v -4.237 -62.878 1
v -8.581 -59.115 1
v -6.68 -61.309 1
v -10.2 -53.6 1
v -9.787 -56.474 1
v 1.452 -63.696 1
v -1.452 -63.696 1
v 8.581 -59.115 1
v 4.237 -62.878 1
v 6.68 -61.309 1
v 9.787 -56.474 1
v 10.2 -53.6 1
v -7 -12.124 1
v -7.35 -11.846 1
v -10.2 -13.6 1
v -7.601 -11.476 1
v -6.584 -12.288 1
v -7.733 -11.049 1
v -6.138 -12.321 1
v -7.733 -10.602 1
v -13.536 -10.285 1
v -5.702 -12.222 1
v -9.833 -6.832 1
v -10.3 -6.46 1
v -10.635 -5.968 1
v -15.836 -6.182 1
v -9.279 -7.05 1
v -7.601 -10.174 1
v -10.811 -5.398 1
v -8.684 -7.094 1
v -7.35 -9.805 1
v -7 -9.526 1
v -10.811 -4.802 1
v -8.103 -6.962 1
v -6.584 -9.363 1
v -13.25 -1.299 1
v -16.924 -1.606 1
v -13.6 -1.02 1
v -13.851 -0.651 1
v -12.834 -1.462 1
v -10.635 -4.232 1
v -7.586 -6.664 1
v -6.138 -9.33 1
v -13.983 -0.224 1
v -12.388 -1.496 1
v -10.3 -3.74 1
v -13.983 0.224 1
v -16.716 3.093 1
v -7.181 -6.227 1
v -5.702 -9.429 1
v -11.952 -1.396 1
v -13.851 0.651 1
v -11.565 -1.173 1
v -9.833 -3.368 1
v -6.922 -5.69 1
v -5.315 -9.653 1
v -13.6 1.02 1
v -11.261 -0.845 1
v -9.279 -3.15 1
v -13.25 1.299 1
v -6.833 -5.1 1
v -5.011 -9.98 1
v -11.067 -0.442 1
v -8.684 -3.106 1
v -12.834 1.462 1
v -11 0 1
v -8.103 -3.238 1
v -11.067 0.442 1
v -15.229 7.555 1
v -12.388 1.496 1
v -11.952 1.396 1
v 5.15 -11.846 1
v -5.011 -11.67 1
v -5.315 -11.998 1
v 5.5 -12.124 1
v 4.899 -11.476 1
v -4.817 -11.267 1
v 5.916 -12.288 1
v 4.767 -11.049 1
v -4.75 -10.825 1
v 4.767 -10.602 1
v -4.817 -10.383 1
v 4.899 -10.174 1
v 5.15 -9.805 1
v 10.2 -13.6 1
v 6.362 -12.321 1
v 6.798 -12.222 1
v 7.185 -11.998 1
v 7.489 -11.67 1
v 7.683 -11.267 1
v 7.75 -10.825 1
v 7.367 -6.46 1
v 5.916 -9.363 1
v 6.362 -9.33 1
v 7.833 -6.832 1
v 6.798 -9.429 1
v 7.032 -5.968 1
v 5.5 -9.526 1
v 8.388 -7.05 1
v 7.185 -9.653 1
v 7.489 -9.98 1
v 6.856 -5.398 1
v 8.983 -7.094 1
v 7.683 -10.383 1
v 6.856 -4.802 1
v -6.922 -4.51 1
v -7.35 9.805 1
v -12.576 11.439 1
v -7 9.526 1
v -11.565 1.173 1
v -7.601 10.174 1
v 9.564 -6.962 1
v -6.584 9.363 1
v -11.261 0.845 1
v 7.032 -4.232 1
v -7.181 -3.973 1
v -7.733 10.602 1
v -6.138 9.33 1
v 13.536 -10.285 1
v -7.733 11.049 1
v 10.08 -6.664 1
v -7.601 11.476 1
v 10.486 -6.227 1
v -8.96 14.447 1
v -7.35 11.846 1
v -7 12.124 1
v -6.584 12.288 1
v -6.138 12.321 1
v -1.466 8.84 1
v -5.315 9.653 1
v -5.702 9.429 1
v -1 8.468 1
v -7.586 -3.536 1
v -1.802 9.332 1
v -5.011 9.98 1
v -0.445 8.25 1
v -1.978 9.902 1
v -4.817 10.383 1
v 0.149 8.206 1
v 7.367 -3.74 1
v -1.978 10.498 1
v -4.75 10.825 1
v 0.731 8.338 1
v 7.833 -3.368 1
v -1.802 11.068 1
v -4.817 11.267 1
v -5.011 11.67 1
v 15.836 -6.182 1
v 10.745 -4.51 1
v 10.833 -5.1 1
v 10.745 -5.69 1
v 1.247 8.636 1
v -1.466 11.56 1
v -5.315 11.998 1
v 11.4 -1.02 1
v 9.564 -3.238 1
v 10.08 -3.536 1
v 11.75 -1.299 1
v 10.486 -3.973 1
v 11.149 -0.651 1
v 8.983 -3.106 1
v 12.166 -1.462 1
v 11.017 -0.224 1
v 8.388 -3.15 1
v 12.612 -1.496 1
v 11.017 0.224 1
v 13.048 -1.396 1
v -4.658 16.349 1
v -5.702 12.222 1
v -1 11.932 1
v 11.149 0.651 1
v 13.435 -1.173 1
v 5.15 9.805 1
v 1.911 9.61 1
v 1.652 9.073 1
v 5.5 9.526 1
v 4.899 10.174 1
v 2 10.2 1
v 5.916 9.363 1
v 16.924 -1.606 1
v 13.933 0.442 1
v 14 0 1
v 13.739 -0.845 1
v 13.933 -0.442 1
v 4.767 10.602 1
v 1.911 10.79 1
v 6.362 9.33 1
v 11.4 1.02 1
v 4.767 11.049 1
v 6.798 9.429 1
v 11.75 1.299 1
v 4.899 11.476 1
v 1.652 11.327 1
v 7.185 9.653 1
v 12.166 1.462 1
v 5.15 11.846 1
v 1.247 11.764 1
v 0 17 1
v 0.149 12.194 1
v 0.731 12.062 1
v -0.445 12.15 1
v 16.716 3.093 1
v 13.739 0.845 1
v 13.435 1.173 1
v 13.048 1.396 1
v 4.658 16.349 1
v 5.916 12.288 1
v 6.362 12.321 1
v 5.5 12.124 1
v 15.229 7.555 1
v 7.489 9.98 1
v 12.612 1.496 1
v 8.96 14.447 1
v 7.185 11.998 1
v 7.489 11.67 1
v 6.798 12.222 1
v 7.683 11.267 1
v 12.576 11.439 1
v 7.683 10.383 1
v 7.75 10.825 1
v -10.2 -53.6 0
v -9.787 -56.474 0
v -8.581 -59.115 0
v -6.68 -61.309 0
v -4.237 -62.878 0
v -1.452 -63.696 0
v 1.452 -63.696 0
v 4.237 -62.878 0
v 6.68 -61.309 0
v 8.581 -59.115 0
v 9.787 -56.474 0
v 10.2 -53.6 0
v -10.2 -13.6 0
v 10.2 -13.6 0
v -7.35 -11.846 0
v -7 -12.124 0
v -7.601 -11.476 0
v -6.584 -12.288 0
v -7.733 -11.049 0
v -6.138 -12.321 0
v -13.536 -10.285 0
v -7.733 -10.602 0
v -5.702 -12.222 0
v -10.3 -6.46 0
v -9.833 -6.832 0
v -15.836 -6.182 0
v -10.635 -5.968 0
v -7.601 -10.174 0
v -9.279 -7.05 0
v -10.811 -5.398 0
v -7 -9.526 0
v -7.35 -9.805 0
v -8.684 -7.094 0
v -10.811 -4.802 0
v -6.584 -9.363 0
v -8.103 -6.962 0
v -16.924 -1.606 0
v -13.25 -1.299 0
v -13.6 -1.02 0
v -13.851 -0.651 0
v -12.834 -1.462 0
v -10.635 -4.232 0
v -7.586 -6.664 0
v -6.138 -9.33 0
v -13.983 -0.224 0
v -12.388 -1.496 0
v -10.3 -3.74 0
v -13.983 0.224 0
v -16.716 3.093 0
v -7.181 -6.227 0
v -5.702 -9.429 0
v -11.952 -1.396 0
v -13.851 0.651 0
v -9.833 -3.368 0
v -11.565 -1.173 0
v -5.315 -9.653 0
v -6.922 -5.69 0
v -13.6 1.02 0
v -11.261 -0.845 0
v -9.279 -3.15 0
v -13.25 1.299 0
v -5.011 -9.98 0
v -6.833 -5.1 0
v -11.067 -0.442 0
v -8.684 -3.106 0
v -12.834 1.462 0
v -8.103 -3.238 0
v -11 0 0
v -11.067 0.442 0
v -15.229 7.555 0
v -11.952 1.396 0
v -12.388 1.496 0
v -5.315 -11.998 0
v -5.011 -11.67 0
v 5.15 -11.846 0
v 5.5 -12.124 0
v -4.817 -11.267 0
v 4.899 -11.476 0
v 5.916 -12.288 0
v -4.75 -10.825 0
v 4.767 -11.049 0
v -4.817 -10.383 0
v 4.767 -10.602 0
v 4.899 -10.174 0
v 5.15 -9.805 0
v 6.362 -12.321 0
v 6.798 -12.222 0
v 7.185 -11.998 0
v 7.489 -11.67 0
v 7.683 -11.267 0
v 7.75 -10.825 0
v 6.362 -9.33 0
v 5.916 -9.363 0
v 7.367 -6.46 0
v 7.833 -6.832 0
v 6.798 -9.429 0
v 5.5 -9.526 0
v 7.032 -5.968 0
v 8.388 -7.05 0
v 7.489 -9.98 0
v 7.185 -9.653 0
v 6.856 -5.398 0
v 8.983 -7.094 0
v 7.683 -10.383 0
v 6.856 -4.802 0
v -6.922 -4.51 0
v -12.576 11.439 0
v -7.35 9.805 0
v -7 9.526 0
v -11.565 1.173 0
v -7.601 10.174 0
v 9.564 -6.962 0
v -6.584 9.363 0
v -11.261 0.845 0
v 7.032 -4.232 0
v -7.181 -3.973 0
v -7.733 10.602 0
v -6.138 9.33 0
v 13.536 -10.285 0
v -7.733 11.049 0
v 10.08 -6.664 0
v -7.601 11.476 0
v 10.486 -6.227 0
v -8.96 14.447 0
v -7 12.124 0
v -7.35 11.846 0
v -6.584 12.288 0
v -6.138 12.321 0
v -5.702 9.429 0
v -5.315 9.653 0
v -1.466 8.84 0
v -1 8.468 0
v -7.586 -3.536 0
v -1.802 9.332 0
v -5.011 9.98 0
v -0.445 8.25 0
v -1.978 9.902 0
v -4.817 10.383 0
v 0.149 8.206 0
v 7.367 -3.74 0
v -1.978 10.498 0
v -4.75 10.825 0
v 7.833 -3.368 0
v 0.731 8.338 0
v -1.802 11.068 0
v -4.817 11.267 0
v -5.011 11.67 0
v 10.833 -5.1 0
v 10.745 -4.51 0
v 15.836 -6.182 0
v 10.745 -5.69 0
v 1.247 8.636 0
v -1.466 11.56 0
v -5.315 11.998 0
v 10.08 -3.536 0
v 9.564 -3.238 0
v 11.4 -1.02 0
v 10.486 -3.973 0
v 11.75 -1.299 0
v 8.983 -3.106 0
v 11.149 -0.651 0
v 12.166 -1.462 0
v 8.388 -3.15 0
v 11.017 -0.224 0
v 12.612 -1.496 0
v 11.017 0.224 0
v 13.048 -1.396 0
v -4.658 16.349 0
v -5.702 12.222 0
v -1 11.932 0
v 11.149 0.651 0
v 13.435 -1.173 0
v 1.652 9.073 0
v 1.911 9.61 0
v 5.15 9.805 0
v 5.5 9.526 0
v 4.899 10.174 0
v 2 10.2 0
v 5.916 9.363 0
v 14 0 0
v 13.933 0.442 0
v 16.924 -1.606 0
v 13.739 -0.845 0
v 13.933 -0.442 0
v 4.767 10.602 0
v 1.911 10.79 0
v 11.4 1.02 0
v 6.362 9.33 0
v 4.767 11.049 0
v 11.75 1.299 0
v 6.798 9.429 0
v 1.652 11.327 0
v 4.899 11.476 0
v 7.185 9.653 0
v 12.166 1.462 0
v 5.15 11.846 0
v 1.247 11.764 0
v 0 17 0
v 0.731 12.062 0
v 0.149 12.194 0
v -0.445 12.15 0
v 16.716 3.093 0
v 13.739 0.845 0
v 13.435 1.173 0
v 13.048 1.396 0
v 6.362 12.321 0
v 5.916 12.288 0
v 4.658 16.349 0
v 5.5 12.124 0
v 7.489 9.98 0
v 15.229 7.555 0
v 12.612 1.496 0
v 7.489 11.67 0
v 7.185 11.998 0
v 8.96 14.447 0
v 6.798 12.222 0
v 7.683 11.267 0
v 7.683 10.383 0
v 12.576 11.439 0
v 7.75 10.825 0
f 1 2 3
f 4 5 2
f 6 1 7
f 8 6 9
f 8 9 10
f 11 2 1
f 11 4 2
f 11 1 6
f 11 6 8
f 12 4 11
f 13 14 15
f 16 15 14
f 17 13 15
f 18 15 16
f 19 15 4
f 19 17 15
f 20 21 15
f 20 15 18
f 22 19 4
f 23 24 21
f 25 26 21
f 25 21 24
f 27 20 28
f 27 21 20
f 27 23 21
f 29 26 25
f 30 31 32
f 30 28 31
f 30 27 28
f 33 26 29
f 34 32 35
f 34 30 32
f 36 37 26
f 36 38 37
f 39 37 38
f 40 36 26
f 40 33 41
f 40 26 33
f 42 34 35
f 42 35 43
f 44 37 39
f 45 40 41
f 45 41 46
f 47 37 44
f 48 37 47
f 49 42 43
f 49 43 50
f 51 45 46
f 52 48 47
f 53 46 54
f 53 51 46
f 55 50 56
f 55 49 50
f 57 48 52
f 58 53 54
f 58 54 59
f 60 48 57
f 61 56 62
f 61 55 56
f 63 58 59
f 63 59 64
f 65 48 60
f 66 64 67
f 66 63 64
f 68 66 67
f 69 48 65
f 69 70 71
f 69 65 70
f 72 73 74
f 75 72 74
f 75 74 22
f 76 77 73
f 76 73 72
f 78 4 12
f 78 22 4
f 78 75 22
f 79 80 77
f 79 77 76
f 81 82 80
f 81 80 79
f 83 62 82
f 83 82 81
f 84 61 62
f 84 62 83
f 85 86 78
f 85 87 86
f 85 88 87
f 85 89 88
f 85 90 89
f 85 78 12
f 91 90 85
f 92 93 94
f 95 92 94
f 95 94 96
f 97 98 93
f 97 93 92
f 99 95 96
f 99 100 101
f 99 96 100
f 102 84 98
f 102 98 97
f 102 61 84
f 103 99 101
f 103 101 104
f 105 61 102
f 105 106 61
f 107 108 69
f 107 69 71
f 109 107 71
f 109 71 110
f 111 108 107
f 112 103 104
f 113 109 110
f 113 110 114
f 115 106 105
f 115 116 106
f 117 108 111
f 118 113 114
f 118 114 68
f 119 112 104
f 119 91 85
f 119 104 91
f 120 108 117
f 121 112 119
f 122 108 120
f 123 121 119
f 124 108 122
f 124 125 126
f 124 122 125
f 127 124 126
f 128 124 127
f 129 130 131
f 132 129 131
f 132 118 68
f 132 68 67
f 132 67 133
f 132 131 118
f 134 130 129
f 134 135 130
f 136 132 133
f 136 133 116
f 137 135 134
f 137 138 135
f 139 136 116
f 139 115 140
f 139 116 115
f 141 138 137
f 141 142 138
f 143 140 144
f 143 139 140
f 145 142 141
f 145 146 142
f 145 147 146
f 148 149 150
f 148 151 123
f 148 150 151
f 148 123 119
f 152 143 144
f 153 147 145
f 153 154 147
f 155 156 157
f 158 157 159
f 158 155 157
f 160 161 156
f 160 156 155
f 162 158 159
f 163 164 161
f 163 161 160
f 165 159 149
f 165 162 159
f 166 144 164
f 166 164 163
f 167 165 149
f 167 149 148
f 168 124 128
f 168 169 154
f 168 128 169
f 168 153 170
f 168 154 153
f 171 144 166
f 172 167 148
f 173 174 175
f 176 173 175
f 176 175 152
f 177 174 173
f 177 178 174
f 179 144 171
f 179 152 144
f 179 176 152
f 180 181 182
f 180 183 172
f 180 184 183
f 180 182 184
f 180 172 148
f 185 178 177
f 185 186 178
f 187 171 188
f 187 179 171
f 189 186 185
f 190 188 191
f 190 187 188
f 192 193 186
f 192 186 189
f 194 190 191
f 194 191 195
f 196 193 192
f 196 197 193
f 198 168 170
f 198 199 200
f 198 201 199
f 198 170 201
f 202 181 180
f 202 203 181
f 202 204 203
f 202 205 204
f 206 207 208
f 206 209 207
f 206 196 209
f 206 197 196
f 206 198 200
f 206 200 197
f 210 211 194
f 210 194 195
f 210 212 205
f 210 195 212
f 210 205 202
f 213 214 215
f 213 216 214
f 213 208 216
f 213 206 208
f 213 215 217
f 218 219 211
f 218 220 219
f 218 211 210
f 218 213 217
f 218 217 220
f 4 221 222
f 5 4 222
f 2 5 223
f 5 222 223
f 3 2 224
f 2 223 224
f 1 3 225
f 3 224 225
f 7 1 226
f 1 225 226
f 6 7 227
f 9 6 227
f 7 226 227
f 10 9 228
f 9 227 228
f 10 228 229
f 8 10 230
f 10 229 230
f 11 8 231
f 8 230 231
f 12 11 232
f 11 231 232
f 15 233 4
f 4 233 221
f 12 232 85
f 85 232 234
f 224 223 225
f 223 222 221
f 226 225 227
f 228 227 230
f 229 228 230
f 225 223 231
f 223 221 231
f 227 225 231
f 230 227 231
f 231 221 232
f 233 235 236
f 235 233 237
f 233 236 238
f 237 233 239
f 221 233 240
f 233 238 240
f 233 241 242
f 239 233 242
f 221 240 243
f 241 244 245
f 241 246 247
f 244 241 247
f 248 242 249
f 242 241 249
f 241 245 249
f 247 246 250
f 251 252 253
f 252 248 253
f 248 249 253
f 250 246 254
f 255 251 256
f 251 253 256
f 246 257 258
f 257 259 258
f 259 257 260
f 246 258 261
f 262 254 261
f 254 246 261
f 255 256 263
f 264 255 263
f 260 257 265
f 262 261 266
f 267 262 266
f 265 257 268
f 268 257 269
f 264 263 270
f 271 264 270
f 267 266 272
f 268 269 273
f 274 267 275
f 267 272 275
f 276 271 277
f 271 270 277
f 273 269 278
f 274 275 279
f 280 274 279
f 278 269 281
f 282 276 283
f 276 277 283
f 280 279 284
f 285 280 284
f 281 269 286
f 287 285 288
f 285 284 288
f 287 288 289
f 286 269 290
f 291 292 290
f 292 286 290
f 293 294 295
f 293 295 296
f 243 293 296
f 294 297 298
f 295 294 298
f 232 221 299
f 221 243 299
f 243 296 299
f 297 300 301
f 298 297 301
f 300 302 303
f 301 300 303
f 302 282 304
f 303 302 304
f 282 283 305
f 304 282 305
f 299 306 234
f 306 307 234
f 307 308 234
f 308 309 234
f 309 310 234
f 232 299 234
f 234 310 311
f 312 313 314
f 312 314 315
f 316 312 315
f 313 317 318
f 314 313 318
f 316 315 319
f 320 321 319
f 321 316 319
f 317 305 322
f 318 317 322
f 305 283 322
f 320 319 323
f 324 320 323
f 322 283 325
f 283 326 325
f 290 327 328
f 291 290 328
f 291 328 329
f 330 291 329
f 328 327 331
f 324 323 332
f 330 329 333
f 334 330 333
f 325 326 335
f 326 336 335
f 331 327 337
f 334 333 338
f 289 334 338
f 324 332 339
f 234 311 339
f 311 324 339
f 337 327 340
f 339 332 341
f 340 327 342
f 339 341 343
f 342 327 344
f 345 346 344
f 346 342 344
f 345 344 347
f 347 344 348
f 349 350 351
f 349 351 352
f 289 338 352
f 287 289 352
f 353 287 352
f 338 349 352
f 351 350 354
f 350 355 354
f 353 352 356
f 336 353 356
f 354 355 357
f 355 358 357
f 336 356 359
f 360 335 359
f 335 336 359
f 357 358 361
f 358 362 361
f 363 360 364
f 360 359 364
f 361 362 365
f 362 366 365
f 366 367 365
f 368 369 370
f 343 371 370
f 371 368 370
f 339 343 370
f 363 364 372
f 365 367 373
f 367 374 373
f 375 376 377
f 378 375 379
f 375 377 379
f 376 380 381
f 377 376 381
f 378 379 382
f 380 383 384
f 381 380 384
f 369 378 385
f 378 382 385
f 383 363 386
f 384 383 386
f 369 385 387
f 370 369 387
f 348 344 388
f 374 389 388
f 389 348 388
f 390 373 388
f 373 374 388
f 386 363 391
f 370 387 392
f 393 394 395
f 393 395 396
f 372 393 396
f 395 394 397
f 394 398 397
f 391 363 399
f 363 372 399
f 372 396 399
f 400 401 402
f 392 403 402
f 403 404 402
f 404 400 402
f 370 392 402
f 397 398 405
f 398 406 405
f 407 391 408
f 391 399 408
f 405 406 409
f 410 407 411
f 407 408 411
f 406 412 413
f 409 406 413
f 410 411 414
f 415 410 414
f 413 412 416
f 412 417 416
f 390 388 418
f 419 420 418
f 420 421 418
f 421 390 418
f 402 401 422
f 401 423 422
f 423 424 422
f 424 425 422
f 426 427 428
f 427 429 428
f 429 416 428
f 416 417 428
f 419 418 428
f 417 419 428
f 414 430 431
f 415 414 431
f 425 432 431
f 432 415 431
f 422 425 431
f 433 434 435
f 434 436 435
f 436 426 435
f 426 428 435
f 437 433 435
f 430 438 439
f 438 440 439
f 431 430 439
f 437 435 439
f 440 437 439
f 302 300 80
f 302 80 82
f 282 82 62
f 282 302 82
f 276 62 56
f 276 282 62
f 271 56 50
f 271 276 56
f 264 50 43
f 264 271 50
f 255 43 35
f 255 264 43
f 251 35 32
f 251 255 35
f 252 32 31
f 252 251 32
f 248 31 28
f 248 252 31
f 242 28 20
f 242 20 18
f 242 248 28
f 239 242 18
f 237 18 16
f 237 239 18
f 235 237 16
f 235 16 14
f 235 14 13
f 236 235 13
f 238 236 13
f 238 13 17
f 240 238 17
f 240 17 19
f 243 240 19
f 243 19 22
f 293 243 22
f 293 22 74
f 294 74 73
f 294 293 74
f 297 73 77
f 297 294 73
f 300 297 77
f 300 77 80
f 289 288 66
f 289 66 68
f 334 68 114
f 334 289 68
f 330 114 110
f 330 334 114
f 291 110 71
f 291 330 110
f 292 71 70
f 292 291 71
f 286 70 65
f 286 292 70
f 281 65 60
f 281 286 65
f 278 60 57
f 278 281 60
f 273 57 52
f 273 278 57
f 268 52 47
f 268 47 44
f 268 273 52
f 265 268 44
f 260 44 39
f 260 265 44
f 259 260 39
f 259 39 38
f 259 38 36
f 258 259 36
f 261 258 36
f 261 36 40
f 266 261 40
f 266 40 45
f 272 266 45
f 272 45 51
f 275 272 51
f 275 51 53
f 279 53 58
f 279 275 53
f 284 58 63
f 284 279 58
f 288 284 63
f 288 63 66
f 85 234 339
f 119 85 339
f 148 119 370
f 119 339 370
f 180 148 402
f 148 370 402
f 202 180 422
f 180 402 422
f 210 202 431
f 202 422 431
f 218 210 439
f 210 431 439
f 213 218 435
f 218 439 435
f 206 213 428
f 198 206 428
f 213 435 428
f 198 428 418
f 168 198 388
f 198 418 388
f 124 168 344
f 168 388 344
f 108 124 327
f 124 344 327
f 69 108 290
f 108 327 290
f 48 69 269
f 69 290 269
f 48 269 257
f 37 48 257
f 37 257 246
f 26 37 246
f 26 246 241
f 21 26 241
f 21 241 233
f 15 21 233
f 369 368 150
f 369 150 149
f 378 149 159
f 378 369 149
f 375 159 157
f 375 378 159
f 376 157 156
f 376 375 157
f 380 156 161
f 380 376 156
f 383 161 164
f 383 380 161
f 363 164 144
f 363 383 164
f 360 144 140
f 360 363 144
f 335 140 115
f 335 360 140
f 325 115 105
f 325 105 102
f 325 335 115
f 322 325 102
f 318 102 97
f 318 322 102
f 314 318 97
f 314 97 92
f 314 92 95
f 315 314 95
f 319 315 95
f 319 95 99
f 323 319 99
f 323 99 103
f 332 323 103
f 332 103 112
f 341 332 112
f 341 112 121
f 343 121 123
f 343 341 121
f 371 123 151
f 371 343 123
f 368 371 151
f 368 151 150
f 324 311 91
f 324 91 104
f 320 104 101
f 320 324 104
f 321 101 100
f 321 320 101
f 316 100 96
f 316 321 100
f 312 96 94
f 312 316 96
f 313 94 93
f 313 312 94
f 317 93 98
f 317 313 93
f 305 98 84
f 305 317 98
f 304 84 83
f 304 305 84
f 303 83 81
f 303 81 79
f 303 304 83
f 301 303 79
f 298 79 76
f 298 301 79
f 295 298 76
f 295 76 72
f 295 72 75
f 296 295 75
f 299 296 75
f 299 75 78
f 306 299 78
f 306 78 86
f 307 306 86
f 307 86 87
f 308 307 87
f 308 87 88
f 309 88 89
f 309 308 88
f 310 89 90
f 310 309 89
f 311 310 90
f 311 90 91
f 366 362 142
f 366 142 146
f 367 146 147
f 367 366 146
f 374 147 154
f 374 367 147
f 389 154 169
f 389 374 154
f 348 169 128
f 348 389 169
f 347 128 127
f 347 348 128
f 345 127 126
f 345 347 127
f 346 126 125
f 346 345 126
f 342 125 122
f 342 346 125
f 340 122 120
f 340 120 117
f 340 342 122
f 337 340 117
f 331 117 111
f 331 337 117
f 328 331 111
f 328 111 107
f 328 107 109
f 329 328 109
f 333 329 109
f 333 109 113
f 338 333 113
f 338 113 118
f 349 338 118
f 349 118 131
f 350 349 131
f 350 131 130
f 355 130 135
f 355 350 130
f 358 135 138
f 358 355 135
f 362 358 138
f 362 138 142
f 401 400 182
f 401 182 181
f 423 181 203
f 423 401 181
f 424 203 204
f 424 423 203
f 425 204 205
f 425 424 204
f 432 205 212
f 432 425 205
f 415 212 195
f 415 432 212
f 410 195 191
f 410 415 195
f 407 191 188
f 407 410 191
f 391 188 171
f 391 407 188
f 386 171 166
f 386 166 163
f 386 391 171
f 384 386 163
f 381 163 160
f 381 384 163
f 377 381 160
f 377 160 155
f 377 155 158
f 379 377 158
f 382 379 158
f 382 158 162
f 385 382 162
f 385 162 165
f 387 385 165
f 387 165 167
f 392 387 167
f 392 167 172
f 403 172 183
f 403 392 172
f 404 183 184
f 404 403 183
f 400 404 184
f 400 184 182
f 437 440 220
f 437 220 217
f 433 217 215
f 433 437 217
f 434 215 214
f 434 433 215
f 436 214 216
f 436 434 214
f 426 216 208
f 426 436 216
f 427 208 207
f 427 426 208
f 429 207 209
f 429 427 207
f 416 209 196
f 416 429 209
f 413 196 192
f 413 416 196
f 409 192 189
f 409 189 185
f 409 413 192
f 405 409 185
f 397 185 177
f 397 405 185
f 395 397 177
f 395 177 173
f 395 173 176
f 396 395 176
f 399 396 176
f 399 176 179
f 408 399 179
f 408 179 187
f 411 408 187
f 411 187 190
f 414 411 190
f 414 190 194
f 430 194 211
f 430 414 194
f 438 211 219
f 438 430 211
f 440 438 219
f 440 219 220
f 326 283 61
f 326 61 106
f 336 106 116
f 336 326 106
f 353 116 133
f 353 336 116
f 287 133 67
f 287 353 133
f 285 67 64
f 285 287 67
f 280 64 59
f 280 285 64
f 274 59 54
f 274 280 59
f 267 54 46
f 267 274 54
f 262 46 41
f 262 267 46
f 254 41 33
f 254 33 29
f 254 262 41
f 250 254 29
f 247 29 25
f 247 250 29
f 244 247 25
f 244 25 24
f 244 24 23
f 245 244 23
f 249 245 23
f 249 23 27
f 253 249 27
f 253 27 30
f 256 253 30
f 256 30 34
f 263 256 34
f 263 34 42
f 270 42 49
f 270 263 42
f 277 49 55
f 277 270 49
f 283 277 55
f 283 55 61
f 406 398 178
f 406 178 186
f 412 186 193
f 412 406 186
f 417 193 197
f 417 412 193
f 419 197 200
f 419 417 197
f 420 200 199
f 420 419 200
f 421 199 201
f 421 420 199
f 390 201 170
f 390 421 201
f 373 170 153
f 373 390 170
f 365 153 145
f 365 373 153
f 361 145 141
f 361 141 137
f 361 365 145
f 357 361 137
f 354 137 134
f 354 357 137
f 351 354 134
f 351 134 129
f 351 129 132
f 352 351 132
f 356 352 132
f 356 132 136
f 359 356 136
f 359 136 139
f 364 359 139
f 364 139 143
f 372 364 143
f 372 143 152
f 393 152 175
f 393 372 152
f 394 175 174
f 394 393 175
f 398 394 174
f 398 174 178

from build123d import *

# Parameters (mm, degrees)
SKETCH2_R           = 2
SKETCH2_R_2         = 1.5
BOSS_EXTRUDE2_DEPTH = 1


with BuildPart() as part:
    # Sketch2 → Boss-Extrude2 (new body)
    with BuildSketch(Plane.XY):
        with BuildLine():
            Line((-10.2, -13.6), (-10.2, -53.6))
            ThreePointArc((-10.2, -53.6), (0, -63.8), (10.2, -53.6))
            Line((10.2, -53.6), (10.2, -13.6))
            ThreePointArc((10.2, -13.6), (0, 17), (-10.2, -13.6))
        make_face()
        with Locations((0, 10.2)):
            Circle(SKETCH2_R, mode=Mode.SUBTRACT)
        with Locations((8.833459119, -5.1)):
            Circle(SKETCH2_R, mode=Mode.SUBTRACT)
        with Locations((-8.833459119, -5.1)):
            Circle(SKETCH2_R, mode=Mode.SUBTRACT)
        with Locations((-12.5, 0)):
            Circle(SKETCH2_R_2, mode=Mode.SUBTRACT)
        with Locations((-6.25, 10.825317547)):
            Circle(SKETCH2_R_2, mode=Mode.SUBTRACT)
        with Locations((6.25, 10.825317547)):
            Circle(SKETCH2_R_2, mode=Mode.SUBTRACT)
        with Locations((12.5, 0)):
            Circle(SKETCH2_R_2, mode=Mode.SUBTRACT)
        with Locations((6.25, -10.825317547)):
            Circle(SKETCH2_R_2, mode=Mode.SUBTRACT)
        with Locations((-6.25, -10.825317547)):
            Circle(SKETCH2_R_2, mode=Mode.SUBTRACT)
    extrude(amount=BOSS_EXTRUDE2_DEPTH)


solid = part.part
